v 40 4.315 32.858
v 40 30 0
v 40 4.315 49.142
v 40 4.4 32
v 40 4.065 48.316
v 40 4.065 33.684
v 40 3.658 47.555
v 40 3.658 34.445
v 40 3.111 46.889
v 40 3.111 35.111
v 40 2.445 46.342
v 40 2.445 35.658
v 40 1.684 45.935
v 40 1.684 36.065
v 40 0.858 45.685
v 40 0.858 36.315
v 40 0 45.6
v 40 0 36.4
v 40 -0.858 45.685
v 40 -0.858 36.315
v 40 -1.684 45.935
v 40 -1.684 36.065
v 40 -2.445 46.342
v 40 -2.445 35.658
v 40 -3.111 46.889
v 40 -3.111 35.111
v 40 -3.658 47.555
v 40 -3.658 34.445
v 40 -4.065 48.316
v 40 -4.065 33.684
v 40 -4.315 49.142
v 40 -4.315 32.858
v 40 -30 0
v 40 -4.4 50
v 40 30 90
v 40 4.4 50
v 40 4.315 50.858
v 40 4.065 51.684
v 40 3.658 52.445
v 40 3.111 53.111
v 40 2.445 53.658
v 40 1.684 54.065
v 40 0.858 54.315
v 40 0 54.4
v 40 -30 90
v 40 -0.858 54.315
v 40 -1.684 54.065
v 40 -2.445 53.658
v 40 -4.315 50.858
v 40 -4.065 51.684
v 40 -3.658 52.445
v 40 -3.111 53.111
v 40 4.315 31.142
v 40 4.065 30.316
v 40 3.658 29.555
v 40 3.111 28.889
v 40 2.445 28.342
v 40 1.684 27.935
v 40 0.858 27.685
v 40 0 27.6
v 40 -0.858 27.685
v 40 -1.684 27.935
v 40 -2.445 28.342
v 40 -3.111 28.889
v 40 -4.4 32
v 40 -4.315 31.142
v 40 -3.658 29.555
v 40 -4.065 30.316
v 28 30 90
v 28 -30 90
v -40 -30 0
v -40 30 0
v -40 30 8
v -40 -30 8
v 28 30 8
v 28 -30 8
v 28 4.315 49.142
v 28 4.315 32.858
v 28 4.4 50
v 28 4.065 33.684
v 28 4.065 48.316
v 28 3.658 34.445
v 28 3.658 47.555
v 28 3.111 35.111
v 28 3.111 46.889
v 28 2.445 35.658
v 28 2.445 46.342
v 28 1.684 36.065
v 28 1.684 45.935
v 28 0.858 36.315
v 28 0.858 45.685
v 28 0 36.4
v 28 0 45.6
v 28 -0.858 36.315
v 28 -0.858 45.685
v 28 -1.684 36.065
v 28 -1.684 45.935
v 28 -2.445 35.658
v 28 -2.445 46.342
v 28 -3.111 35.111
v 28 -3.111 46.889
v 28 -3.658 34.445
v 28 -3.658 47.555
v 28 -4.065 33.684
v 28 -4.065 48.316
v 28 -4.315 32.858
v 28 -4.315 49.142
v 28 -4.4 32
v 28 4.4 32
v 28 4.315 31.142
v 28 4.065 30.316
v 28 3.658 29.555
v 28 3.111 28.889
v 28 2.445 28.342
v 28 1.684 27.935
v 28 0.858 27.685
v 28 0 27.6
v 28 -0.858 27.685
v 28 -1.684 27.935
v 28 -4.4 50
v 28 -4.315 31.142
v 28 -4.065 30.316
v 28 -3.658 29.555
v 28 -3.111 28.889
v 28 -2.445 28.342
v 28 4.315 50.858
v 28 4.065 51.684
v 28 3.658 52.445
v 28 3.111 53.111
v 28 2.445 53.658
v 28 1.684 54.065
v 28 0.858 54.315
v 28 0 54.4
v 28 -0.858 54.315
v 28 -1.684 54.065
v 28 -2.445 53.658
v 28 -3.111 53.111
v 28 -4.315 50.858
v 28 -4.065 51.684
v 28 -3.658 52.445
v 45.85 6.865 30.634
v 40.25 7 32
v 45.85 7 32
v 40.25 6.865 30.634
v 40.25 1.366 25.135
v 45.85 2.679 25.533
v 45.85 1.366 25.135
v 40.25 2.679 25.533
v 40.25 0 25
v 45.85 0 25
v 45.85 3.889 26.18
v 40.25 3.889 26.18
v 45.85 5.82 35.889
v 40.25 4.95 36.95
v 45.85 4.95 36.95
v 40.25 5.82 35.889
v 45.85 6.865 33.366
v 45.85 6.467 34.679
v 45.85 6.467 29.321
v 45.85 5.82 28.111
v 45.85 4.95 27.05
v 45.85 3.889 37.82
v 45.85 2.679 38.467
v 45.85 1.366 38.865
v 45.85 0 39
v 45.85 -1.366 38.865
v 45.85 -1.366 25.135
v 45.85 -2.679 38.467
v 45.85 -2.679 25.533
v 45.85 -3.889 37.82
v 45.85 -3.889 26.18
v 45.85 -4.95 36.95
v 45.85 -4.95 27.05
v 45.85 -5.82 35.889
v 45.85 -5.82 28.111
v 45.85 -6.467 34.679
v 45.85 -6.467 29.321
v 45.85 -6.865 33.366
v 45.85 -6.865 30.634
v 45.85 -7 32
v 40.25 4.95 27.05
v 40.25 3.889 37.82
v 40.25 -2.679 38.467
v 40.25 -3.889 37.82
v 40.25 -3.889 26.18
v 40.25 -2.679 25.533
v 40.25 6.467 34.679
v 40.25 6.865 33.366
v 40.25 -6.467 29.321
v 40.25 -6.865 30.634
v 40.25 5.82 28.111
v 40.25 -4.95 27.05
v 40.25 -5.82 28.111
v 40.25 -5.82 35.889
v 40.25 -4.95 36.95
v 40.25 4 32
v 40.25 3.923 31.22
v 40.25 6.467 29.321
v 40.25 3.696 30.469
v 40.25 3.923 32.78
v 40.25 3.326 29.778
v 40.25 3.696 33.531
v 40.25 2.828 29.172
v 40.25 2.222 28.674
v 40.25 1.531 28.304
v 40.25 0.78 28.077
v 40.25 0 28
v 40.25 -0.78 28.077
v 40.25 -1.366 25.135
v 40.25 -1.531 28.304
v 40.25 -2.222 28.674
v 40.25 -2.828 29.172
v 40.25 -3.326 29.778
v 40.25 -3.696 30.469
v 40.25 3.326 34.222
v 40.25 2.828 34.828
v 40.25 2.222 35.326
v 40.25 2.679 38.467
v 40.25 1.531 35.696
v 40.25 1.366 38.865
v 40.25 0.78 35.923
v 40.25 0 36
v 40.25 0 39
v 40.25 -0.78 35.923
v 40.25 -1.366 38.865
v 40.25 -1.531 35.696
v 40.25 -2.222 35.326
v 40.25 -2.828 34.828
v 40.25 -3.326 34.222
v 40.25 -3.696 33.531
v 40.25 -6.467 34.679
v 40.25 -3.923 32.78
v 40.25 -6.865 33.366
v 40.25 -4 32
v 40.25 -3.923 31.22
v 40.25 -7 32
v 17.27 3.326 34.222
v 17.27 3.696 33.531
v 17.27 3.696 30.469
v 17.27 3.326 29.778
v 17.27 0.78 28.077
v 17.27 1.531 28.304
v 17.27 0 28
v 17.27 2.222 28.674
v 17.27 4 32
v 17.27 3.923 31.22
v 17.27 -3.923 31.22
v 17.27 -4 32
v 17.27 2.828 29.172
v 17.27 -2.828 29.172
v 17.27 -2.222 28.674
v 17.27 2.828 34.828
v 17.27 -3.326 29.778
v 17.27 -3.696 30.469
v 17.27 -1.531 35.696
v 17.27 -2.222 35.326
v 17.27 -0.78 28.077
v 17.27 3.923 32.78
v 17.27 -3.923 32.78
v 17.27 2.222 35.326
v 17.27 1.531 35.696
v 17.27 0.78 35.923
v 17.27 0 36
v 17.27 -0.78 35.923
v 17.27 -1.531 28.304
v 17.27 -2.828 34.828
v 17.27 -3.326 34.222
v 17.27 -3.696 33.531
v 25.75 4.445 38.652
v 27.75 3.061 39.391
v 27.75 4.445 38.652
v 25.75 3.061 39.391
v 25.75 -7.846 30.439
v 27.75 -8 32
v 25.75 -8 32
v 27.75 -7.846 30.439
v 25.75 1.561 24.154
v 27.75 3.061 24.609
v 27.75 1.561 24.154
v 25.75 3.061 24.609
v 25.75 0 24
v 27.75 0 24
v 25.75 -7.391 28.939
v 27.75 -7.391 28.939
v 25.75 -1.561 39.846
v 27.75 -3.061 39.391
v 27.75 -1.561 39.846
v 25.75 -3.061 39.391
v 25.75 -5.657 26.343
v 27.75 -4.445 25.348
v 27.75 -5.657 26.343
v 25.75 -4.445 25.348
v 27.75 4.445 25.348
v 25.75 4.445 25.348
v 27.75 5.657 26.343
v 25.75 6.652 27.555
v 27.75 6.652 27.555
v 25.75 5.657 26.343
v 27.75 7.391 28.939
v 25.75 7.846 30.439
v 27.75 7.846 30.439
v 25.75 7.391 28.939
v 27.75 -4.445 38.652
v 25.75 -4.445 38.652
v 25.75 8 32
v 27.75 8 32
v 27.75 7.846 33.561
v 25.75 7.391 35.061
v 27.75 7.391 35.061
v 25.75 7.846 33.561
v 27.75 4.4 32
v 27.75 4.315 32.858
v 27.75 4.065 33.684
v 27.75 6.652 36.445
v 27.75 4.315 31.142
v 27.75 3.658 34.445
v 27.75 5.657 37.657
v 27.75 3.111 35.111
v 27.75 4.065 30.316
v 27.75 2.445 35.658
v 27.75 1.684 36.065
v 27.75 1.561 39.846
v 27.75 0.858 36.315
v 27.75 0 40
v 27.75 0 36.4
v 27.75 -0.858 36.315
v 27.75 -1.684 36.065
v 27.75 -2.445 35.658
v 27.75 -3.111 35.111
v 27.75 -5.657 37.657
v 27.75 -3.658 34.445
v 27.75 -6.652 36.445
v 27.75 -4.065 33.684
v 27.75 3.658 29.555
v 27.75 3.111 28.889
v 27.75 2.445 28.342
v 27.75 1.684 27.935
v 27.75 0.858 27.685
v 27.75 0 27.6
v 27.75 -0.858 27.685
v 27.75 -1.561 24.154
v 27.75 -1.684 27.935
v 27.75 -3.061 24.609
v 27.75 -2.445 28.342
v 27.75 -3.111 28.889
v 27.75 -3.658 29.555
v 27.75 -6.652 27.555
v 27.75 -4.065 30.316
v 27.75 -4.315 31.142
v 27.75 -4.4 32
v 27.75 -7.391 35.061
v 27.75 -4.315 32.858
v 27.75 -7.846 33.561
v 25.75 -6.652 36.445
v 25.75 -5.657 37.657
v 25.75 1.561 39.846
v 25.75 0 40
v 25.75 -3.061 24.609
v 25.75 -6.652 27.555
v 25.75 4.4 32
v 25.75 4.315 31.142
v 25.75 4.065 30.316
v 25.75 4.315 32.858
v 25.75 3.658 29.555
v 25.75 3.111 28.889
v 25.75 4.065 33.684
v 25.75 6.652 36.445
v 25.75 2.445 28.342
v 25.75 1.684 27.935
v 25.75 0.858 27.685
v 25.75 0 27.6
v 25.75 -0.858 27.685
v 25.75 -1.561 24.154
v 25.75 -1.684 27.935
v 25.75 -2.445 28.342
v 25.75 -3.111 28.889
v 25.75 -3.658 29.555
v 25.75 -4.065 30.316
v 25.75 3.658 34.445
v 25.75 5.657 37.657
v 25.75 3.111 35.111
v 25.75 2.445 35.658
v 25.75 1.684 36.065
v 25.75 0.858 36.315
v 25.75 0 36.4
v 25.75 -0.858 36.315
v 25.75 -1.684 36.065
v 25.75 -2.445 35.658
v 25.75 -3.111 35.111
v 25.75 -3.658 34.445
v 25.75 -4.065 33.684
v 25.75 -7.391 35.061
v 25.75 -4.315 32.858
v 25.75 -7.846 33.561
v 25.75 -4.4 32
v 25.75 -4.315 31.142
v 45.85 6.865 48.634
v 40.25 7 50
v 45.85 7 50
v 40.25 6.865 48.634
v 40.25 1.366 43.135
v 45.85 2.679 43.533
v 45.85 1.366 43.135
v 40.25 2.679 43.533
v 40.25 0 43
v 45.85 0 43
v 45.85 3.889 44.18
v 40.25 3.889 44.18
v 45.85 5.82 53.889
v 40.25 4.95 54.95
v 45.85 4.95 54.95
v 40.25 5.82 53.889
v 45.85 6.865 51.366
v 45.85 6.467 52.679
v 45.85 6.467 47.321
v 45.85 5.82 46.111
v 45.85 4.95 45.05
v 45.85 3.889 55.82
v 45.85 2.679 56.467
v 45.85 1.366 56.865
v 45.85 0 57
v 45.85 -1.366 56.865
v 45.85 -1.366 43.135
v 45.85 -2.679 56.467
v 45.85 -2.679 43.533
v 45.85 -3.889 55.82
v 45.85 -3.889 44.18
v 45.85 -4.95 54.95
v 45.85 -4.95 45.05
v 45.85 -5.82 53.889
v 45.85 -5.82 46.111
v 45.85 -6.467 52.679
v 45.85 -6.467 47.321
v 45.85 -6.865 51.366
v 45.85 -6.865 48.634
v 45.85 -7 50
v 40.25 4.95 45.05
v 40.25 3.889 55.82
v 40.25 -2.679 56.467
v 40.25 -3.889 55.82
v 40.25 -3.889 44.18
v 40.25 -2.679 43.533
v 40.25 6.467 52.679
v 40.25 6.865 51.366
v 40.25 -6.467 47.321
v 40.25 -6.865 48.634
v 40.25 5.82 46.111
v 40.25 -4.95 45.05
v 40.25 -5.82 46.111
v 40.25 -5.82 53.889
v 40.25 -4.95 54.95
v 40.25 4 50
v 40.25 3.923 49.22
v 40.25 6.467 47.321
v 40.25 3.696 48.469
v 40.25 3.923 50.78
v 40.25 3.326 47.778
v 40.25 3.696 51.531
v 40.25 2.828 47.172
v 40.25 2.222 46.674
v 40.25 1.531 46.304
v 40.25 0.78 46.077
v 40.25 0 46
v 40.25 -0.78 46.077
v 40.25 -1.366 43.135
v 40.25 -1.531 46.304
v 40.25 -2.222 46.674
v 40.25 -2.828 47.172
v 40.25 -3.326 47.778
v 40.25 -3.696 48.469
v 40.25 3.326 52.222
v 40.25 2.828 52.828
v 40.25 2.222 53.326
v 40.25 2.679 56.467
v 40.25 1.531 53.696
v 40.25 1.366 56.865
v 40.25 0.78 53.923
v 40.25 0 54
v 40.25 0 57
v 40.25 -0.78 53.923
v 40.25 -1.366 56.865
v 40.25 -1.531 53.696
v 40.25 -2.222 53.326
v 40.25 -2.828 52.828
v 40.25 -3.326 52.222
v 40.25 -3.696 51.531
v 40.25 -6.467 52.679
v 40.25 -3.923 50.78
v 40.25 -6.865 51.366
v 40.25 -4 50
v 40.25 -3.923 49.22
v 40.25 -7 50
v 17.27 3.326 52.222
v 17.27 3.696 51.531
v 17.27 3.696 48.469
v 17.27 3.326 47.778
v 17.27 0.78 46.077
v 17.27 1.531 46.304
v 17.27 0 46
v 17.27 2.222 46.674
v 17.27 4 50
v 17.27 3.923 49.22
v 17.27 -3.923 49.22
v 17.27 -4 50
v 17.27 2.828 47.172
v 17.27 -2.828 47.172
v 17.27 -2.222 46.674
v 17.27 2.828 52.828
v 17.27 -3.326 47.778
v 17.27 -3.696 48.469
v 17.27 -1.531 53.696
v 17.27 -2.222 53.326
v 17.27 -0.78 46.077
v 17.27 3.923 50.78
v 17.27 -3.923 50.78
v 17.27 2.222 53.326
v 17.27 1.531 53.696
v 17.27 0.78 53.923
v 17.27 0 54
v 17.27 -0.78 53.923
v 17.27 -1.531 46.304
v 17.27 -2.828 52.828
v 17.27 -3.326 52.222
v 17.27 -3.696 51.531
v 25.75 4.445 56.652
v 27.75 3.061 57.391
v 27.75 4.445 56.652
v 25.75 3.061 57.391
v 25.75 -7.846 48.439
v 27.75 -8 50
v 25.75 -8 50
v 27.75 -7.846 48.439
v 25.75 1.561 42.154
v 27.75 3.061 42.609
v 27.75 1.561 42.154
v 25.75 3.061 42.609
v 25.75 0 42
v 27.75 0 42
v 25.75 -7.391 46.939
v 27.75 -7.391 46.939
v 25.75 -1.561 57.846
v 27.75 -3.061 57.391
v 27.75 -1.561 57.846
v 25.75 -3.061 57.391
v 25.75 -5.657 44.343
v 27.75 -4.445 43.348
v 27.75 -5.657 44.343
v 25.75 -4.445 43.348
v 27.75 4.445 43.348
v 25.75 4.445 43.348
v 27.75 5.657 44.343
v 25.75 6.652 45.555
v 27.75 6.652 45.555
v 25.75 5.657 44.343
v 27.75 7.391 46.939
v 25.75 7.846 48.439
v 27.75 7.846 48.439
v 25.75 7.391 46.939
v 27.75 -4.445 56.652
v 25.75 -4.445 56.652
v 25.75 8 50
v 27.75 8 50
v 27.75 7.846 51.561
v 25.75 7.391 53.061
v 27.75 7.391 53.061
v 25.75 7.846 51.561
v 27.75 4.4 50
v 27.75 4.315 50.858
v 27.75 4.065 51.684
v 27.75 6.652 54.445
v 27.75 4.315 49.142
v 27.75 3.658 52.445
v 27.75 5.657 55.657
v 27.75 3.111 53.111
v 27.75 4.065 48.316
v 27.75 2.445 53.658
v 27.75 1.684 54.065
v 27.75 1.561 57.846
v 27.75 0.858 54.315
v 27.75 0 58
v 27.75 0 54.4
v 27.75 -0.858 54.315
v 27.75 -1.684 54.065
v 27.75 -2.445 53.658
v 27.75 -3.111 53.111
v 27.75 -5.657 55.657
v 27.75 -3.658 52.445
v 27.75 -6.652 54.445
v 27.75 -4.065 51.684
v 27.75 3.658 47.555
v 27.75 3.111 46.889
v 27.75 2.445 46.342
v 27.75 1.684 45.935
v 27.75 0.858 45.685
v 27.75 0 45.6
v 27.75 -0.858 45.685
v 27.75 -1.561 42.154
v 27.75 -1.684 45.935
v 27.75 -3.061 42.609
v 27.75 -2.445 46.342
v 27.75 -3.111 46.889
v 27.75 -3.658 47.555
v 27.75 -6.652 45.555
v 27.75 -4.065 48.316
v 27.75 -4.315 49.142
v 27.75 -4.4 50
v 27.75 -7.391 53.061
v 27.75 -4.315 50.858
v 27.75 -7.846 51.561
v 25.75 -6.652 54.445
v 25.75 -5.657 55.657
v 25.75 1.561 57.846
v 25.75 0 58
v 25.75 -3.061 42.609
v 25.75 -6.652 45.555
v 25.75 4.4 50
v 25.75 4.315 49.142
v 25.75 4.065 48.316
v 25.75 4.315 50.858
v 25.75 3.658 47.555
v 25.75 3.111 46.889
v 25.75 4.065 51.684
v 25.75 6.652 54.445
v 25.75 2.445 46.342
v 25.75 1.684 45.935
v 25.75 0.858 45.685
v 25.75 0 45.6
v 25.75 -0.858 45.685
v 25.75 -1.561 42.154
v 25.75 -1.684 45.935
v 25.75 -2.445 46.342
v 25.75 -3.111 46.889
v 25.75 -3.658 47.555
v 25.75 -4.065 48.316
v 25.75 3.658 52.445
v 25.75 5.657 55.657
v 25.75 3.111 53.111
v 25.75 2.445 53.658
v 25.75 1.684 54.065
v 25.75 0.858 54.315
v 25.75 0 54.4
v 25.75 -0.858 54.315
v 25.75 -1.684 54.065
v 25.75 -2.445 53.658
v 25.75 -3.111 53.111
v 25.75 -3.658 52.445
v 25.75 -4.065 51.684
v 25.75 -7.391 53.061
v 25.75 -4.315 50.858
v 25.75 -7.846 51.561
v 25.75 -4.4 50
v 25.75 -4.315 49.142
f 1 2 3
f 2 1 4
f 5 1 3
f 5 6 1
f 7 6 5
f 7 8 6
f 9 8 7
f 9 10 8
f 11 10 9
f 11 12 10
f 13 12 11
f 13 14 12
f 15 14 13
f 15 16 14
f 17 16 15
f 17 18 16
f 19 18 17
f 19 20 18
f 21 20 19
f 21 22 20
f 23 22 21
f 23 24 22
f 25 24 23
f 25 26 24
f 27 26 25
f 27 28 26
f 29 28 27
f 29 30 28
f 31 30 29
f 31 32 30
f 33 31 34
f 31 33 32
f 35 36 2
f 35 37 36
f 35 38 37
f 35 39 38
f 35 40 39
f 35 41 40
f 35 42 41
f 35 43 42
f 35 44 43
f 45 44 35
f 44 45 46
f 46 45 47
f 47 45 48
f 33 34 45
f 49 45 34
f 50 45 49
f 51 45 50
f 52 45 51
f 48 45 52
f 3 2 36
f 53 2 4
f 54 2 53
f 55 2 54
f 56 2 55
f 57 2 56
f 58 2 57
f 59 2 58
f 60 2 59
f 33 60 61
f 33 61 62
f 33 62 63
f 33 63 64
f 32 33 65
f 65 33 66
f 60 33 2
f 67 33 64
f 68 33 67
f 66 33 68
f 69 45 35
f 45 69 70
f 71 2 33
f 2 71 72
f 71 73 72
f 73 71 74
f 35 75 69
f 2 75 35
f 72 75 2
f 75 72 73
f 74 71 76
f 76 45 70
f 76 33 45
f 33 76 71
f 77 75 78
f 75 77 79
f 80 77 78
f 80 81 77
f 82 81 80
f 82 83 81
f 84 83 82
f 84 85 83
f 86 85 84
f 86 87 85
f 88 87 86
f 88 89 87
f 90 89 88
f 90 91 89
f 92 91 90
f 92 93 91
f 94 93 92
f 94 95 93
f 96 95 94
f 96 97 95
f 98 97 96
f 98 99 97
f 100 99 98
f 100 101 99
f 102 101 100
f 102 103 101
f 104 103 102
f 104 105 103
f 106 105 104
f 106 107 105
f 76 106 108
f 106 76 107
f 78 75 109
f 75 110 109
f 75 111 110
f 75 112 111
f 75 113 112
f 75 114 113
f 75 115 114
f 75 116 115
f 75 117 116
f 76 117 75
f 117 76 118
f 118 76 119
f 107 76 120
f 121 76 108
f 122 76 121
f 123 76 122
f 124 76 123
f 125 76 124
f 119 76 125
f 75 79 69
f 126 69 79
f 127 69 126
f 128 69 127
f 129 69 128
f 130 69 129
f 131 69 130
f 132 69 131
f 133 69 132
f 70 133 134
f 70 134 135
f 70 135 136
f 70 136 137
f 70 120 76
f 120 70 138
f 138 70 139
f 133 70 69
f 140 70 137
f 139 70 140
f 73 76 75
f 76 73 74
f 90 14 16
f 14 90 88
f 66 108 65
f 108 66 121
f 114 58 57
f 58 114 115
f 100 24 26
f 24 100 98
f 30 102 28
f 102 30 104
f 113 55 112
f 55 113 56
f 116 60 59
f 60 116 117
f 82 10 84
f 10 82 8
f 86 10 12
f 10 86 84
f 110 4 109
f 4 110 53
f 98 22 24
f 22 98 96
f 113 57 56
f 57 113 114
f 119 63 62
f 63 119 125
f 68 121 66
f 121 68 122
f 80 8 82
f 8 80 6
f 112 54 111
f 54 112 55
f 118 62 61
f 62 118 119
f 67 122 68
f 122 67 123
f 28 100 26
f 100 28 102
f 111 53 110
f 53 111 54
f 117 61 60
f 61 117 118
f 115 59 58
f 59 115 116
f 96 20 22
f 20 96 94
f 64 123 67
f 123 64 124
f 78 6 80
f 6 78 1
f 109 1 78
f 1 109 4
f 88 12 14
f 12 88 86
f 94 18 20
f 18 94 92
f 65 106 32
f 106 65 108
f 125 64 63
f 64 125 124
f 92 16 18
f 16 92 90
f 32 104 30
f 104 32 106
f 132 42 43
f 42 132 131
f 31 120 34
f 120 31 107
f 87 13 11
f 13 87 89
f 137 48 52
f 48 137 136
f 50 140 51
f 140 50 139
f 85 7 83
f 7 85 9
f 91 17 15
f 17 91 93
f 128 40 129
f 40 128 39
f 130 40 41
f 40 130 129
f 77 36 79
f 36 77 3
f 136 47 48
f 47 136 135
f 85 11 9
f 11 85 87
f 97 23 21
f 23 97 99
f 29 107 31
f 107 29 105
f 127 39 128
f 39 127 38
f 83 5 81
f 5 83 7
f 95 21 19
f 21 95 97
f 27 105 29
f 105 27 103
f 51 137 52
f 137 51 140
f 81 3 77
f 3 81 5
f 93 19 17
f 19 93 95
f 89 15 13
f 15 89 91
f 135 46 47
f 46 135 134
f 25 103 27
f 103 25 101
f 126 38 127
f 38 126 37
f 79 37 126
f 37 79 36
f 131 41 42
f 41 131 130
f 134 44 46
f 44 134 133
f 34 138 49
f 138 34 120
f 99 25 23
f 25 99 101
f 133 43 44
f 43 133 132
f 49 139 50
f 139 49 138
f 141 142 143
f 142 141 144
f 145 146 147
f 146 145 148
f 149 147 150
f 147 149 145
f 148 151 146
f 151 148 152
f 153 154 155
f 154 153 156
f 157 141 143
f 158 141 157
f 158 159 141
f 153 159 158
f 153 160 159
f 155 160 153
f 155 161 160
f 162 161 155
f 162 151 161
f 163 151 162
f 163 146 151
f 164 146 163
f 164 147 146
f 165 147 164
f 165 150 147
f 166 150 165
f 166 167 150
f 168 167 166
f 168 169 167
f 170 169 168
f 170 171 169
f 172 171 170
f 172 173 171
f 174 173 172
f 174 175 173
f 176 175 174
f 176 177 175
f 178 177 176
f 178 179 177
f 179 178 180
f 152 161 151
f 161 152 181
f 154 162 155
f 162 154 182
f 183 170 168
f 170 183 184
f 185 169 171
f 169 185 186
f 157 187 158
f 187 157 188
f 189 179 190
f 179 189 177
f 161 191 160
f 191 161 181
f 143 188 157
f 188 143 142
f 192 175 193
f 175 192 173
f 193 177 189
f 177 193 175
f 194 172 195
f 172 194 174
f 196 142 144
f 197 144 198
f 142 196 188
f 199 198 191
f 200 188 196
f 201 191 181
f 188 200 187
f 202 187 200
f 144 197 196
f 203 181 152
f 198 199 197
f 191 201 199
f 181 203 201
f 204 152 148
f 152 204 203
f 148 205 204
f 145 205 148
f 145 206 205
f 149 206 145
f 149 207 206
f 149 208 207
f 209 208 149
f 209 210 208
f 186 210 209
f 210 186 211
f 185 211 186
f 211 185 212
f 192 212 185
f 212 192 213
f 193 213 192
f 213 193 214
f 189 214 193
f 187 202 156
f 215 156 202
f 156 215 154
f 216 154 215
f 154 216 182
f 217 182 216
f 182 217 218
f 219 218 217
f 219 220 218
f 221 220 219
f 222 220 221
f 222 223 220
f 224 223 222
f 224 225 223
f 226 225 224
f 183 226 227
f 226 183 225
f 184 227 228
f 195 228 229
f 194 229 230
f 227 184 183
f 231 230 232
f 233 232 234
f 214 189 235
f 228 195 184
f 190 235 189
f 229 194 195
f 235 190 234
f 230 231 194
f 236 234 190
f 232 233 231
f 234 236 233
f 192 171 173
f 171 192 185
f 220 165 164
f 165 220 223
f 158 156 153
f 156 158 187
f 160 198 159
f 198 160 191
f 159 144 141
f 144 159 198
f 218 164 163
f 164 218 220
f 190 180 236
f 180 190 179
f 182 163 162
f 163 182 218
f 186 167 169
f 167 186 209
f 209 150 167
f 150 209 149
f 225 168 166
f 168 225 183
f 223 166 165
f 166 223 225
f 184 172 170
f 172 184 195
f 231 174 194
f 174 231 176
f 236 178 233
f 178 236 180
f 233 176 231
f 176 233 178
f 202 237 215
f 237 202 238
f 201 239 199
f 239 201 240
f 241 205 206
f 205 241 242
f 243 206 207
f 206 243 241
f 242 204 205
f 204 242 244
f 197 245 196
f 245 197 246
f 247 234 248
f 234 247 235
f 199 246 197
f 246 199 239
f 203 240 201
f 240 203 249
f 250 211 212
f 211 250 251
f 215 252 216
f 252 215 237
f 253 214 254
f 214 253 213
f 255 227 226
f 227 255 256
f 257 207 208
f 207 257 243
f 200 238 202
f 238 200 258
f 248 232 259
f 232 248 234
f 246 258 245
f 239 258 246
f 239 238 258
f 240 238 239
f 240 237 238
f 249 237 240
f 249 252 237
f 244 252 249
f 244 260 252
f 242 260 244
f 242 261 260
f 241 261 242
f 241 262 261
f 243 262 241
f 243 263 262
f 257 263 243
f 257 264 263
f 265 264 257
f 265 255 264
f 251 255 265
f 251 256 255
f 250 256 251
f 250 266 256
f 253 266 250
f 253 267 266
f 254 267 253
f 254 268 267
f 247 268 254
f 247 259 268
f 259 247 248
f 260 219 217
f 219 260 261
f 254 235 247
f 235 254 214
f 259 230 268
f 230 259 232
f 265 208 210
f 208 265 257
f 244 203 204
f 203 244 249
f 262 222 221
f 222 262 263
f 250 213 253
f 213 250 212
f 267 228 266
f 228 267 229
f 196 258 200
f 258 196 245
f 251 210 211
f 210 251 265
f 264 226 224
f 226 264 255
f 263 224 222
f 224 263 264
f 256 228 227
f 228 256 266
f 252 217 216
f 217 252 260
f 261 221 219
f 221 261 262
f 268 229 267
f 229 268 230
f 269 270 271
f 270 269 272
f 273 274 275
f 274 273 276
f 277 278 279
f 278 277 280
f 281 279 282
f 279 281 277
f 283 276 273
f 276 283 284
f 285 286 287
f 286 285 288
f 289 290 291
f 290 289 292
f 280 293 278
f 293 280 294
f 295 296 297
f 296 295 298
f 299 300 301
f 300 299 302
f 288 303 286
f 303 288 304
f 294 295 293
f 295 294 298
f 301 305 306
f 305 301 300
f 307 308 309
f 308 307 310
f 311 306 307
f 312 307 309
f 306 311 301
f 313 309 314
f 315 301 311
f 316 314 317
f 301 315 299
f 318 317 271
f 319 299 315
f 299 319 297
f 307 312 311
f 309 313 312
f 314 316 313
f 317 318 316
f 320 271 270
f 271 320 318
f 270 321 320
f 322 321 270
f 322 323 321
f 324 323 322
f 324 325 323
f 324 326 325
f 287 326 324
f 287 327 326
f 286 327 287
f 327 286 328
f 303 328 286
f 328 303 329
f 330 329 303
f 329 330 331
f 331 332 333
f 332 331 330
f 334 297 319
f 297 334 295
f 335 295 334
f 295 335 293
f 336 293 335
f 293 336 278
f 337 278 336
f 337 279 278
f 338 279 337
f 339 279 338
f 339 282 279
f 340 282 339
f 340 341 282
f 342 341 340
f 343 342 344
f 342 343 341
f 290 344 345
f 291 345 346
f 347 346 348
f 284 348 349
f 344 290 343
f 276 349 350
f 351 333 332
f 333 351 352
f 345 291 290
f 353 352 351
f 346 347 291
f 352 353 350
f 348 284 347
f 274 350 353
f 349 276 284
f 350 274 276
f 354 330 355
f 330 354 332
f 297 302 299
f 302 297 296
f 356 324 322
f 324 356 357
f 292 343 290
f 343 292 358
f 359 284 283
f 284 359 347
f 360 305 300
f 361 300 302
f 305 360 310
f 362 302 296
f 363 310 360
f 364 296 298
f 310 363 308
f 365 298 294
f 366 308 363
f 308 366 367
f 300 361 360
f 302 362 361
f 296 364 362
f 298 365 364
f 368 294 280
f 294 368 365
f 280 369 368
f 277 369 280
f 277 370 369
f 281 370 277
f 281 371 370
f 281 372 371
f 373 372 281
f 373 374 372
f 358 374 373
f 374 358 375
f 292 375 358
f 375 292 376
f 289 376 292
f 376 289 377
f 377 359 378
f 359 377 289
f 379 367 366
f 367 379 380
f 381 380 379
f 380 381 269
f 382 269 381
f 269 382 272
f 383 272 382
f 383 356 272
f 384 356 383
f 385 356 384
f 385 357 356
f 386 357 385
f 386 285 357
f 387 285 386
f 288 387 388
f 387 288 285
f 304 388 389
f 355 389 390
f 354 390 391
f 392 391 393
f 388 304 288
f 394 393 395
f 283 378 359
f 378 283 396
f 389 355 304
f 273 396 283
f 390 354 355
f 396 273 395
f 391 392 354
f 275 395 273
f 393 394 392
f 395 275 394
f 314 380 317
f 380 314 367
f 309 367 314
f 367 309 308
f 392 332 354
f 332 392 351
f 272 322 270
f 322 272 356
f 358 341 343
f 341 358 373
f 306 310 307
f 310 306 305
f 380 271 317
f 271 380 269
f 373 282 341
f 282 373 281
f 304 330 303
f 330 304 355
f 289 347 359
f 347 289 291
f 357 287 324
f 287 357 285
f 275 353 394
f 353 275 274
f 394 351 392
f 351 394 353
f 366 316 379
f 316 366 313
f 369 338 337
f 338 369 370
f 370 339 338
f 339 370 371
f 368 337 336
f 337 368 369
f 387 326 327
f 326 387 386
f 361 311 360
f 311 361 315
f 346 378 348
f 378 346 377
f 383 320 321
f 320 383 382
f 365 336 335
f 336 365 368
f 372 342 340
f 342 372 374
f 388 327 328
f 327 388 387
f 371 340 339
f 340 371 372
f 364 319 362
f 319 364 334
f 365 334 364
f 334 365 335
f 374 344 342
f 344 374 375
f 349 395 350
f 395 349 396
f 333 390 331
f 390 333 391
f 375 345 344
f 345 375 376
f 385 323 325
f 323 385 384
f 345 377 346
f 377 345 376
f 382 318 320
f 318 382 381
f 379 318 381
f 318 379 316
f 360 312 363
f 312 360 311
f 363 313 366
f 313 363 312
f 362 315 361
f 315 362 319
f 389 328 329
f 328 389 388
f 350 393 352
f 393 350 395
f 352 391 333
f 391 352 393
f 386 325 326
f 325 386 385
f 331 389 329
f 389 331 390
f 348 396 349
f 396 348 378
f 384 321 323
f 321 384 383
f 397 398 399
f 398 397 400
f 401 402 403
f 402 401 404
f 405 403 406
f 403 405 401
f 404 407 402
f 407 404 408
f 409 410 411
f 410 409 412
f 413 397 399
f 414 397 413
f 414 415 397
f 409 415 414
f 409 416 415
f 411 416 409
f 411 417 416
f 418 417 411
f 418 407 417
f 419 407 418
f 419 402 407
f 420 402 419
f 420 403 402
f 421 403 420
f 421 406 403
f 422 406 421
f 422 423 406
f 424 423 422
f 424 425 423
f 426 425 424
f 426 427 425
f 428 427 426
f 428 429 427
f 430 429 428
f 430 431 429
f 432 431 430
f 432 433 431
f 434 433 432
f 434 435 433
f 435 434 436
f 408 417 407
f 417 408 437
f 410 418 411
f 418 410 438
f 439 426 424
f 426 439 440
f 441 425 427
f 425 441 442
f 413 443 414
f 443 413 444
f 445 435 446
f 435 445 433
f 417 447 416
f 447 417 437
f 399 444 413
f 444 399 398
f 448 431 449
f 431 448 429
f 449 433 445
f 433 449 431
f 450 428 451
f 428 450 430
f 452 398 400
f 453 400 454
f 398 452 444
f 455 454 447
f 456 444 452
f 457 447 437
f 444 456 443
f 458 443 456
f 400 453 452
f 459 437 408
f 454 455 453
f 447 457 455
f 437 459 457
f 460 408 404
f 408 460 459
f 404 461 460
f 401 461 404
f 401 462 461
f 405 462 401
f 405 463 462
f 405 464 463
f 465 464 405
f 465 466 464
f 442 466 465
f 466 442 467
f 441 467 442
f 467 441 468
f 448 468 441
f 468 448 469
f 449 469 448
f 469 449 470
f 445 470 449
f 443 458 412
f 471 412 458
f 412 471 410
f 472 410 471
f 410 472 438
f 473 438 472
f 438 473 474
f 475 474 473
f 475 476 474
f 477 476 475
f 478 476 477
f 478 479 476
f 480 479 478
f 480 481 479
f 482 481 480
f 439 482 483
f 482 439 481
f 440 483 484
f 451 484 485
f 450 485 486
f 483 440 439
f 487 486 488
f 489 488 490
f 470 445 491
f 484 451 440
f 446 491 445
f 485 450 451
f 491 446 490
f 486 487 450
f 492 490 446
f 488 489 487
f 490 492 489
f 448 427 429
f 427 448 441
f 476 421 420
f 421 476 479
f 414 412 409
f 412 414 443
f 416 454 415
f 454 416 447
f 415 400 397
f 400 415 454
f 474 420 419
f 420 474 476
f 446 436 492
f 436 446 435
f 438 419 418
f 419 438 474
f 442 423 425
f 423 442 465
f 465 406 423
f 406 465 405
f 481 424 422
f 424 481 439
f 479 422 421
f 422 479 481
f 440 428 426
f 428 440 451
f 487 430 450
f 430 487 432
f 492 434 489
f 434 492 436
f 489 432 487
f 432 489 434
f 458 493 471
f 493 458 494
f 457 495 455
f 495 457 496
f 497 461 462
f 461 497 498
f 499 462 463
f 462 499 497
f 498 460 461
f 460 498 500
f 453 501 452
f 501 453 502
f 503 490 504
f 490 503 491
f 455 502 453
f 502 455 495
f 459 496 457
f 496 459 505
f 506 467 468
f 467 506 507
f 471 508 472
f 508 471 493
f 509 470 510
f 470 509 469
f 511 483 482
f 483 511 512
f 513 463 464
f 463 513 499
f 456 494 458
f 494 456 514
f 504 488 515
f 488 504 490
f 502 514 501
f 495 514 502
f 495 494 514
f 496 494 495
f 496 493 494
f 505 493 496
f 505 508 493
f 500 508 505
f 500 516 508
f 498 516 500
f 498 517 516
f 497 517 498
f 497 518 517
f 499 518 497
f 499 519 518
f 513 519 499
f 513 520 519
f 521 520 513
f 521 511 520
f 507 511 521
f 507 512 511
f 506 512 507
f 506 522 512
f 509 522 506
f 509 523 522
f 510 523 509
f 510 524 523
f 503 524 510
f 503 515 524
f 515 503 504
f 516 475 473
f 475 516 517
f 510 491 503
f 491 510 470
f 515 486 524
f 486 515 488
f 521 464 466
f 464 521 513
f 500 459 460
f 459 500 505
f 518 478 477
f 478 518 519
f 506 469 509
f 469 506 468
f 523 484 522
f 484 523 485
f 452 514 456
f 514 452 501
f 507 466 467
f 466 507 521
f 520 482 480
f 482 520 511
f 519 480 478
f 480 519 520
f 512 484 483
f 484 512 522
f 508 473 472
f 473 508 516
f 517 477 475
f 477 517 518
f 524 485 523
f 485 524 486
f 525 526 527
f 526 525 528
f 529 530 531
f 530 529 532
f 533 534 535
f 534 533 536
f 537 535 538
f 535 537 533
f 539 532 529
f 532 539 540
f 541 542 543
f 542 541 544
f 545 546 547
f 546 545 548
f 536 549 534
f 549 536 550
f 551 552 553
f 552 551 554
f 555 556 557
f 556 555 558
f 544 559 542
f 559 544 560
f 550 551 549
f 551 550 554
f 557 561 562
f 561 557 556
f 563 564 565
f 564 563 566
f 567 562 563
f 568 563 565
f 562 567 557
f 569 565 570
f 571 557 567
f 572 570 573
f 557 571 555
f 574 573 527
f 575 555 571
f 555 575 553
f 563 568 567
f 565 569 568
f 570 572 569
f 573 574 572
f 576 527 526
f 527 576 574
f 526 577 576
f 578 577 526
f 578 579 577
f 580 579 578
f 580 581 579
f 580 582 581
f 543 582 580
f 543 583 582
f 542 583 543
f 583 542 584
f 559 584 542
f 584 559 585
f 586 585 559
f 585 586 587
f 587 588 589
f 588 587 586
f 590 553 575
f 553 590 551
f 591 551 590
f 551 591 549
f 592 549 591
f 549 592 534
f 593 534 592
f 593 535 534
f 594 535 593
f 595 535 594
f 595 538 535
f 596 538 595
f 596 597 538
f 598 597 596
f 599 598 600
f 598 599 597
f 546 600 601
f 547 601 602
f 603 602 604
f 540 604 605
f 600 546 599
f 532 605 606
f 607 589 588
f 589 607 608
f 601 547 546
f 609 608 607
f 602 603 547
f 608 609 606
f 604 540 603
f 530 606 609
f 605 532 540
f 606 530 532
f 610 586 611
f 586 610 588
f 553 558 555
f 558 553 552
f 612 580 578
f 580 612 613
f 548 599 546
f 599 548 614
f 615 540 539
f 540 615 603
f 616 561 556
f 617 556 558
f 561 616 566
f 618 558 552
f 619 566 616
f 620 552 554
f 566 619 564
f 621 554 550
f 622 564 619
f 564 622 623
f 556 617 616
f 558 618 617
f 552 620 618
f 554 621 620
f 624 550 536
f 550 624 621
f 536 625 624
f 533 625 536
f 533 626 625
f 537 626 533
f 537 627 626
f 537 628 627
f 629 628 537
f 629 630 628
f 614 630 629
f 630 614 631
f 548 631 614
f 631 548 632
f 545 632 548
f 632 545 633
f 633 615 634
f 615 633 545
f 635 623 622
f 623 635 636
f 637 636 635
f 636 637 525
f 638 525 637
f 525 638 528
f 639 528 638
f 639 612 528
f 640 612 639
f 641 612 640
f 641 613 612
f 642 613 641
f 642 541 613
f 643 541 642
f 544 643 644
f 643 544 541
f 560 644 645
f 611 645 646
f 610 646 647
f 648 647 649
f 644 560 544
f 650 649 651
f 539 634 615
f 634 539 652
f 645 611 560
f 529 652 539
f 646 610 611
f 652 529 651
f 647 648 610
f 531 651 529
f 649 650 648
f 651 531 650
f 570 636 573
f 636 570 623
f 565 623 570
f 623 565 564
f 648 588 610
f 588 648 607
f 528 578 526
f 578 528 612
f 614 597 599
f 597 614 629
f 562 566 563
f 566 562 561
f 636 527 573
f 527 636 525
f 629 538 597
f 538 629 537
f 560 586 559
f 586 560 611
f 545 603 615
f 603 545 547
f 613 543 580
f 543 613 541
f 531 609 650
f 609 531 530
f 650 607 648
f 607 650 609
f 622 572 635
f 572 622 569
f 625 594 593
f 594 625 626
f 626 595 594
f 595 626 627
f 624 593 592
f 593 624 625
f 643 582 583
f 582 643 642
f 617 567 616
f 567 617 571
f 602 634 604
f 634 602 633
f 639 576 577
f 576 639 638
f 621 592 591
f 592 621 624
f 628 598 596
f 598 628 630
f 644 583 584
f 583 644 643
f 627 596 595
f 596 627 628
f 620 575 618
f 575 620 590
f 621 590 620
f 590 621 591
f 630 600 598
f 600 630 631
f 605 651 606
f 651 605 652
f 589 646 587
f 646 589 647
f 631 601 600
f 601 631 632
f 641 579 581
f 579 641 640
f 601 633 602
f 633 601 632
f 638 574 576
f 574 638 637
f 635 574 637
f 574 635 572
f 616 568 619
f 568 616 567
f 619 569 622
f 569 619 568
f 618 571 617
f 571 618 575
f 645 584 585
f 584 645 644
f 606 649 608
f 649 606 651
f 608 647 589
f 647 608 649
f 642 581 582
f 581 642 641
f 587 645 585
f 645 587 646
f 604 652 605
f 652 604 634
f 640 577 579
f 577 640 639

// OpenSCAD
$fn = 32;

// ------------------------------------------------------------------------
// Bolted bracket: 80 x 60 mm bracket with 2 bolt joints
// Every part is its own module, assembly() places them once.
// ------------------------------------------------------------------------

// --- part 1 ---
module bracket() {
  difference() {
    translate([-40, -30, 0]) cube([80, 60, 90]);
    translate([-41, -31, 8]) cube([69, 62, 83]);
    translate([34, 0, 32]) rotate([0, 90, 0]) cylinder(h = 14, d = 8.8, center = true);
    translate([34, 0, 50]) rotate([0, 90, 0]) cylinder(h = 14, d = 8.8, center = true);
  }
}

// --- part 2 ---
module bolt1() {
  cylinder(h = 5.6, d = 14);
  translate([0, 0, -22.98]) cylinder(h = 22.98, d = 8);
}

// --- part 3 ---
module washer1() {
  difference() {
      translate([0, 0, 0]) cylinder(h = 2, d = 16);
      translate([0, 0, -1]) cylinder(h = 4, d = 8.8);
    }
}

// --- part 4 ---
module bolt2() {
  cylinder(h = 5.6, d = 14);
  translate([0, 0, -22.98]) cylinder(h = 22.98, d = 8);
}

// --- part 5 ---
module washer2() {
  difference() {
      translate([0, 0, 0]) cylinder(h = 2, d = 16);
      translate([0, 0, -1]) cylinder(h = 4, d = 8.8);
    }
}

// --- assembly ---
module assembly() {
  translate([0, 0, 0]) rotate([0, 0, 0]) bracket();
  translate([40.25, 0, 32]) rotate([0, 90, 0]) bolt1();
  translate([25.75, 0, 32]) rotate([0, 90, 0]) washer1();
  translate([40.25, 0, 50]) rotate([0, 90, 0]) bolt2();
  translate([25.75, 0, 50]) rotate([0, 90, 0]) washer2();
}

assembly();
